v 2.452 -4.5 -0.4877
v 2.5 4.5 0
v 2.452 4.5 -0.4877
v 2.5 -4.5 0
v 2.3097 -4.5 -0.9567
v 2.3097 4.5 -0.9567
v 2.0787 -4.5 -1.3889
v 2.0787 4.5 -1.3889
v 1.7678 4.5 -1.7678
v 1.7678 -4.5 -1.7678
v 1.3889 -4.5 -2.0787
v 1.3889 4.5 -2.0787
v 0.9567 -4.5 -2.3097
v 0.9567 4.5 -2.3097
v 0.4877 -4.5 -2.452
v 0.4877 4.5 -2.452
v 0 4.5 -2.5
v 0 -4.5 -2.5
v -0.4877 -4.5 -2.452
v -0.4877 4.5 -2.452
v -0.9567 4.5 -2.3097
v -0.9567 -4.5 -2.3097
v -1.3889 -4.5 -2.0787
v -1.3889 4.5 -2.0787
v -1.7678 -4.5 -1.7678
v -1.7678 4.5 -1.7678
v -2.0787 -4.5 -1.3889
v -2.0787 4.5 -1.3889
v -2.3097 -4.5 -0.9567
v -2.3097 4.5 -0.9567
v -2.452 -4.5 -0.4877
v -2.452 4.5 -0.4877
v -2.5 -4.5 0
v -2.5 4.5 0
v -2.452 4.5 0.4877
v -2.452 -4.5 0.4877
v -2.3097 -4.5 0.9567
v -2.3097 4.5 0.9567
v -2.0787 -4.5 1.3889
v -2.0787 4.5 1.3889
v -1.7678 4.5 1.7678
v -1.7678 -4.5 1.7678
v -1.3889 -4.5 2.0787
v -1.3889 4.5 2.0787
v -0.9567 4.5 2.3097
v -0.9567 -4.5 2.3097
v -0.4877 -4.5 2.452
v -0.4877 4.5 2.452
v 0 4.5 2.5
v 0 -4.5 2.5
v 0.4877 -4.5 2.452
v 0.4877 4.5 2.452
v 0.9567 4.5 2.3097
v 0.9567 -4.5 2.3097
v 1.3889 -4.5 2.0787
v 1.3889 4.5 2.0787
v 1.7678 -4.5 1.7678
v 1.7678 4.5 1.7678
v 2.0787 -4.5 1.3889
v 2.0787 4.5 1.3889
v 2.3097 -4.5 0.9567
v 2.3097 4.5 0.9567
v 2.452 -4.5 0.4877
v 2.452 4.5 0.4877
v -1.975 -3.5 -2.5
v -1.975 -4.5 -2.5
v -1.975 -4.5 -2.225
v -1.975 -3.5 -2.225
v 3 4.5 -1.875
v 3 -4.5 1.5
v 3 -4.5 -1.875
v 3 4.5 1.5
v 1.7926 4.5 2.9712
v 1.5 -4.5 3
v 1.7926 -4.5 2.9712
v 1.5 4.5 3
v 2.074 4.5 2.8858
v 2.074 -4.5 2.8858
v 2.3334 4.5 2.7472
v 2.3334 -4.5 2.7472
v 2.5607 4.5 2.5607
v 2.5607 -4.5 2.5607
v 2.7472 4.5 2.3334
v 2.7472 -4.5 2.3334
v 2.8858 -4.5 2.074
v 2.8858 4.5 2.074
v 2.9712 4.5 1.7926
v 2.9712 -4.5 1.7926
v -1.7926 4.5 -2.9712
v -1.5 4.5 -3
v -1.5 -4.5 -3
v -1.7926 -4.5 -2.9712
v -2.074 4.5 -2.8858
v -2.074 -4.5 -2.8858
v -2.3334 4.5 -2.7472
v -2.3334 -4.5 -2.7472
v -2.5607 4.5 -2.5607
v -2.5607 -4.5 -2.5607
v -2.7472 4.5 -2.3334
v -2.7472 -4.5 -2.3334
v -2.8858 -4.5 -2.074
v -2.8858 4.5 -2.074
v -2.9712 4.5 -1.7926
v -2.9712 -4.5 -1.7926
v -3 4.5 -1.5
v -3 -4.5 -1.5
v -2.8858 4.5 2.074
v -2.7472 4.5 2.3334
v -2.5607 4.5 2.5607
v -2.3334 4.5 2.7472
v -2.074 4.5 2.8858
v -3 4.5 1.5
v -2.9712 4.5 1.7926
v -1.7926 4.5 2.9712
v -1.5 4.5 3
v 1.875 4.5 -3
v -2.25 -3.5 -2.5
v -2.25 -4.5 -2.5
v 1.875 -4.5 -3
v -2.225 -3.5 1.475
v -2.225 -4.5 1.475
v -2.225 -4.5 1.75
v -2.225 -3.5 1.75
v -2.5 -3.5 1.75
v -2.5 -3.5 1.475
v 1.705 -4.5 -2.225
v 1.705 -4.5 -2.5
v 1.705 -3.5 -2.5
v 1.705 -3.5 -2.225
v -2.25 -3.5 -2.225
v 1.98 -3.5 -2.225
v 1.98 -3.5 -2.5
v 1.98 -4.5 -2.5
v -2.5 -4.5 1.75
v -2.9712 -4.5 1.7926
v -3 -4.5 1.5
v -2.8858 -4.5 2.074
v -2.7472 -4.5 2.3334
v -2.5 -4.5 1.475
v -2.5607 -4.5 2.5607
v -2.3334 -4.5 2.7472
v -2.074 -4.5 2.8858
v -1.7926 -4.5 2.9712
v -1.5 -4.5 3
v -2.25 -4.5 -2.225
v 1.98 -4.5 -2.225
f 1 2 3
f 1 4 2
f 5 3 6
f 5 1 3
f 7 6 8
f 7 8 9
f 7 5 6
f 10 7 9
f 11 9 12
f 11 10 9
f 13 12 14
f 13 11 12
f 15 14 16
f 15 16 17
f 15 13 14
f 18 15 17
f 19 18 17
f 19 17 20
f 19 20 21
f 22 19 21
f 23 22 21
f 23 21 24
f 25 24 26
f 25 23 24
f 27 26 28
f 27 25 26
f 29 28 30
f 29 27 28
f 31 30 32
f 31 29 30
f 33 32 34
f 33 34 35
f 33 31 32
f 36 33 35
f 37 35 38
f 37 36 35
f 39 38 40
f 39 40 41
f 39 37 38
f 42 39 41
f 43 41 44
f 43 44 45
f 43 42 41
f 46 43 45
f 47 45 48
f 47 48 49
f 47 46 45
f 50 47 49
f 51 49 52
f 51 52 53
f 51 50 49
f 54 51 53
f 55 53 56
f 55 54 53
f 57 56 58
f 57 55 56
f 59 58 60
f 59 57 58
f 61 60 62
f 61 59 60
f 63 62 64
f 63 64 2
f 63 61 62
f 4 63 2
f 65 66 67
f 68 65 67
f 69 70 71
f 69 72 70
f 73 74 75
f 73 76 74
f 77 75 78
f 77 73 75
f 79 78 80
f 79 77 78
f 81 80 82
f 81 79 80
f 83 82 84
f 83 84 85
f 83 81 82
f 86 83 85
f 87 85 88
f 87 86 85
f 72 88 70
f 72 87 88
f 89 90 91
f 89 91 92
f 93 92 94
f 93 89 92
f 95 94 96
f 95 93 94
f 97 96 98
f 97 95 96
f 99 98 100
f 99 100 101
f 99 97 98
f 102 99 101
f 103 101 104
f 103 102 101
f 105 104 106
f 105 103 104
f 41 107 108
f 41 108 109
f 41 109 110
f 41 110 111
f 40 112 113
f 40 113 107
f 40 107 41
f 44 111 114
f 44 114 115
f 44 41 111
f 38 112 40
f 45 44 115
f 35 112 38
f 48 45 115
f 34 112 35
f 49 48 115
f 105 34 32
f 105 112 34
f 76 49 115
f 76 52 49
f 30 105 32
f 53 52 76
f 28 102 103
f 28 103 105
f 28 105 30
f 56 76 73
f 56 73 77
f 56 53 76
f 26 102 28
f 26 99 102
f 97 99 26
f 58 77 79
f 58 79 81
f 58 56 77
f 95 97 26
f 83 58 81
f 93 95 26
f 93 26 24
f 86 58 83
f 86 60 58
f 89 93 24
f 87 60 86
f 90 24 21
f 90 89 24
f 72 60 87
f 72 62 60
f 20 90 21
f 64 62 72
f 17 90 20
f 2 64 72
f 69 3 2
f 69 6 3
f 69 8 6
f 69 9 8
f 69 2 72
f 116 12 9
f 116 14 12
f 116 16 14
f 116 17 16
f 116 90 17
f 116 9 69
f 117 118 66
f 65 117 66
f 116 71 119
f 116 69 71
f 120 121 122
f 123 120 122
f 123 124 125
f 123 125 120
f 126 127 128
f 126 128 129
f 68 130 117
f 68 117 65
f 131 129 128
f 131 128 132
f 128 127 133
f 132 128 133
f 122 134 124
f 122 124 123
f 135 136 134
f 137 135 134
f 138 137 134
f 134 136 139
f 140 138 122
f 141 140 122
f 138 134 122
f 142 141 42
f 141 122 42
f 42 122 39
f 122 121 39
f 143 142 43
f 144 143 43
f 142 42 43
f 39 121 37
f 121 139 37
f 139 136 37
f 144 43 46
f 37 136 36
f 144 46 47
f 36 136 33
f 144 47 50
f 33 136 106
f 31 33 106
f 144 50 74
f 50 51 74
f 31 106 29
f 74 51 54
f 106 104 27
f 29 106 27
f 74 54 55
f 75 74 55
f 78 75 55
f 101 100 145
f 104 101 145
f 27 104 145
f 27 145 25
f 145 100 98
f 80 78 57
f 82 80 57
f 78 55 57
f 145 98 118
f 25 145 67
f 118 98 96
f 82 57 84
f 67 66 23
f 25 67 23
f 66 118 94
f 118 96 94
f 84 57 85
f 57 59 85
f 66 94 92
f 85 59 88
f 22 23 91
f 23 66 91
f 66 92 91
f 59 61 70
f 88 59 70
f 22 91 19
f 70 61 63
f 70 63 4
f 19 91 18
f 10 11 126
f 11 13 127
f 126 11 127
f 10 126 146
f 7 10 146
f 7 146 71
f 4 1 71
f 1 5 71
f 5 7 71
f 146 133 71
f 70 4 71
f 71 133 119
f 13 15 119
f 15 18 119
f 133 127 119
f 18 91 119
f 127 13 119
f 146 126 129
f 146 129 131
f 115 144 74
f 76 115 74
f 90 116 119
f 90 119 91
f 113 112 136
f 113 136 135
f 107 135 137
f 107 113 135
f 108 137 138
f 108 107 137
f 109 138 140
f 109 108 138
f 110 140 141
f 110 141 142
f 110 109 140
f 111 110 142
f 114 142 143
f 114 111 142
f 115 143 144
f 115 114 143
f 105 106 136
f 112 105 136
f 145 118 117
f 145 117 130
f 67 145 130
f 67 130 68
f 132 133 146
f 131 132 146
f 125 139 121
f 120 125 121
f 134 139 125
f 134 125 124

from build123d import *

# Parameters (mm, degrees)
SKETCH1_R           = 2.5
BOSS_EXTRUDE1_DEPTH = 4.5
SKETCH2_W           = 0.275
SKETCH2_H           = 0.275
CUT_EXTRUDE1_DEPTH  = 1


with BuildPart() as part:
    # Sketch1 → Boss-Extrude1 (new body, symmetric)
    with BuildSketch(Plane(origin=(0, 0, 0), x_dir=(1, 0, 0), z_dir=(0, 1, 0))):
        with BuildLine():
            Line((3, 1.875), (1.875, 3))
            Line((1.875, 3), (-1.5, 3))
            ThreePointArc((-1.5, 3), (-2.560660172, 2.560660172), (-3, 1.5))
            Line((-3, 1.5), (-3, -1.5))
            ThreePointArc((-3, -1.5), (-2.560660172, -2.560660172), (-1.5, -3))
            Line((-1.5, -3), (1.5, -3))
            ThreePointArc((1.5, -3), (2.560660172, -2.560660172), (3, -1.5))
            Line((3, -1.5), (3, 1.875))
        make_face()
        Circle(SKETCH1_R, mode=Mode.SUBTRACT)
    extrude(amount=BOSS_EXTRUDE1_DEPTH, both=True)

    # Sketch2 → Cut-Extrude1 (cut)
    with BuildSketch(Plane.XZ.offset(4.5)):
        with Locations((-2.3625, 1.6125)):
            Rectangle(SKETCH2_W, SKETCH2_H)
        with Locations((-2.1125, -2.3625)):
            Rectangle(SKETCH2_W, SKETCH2_H)
        with Locations((1.8425, -2.3625)):
            Rectangle(SKETCH2_W, SKETCH2_H)
    extrude(amount=-CUT_EXTRUDE1_DEPTH, mode=Mode.SUBTRACT)


solid = part.part
